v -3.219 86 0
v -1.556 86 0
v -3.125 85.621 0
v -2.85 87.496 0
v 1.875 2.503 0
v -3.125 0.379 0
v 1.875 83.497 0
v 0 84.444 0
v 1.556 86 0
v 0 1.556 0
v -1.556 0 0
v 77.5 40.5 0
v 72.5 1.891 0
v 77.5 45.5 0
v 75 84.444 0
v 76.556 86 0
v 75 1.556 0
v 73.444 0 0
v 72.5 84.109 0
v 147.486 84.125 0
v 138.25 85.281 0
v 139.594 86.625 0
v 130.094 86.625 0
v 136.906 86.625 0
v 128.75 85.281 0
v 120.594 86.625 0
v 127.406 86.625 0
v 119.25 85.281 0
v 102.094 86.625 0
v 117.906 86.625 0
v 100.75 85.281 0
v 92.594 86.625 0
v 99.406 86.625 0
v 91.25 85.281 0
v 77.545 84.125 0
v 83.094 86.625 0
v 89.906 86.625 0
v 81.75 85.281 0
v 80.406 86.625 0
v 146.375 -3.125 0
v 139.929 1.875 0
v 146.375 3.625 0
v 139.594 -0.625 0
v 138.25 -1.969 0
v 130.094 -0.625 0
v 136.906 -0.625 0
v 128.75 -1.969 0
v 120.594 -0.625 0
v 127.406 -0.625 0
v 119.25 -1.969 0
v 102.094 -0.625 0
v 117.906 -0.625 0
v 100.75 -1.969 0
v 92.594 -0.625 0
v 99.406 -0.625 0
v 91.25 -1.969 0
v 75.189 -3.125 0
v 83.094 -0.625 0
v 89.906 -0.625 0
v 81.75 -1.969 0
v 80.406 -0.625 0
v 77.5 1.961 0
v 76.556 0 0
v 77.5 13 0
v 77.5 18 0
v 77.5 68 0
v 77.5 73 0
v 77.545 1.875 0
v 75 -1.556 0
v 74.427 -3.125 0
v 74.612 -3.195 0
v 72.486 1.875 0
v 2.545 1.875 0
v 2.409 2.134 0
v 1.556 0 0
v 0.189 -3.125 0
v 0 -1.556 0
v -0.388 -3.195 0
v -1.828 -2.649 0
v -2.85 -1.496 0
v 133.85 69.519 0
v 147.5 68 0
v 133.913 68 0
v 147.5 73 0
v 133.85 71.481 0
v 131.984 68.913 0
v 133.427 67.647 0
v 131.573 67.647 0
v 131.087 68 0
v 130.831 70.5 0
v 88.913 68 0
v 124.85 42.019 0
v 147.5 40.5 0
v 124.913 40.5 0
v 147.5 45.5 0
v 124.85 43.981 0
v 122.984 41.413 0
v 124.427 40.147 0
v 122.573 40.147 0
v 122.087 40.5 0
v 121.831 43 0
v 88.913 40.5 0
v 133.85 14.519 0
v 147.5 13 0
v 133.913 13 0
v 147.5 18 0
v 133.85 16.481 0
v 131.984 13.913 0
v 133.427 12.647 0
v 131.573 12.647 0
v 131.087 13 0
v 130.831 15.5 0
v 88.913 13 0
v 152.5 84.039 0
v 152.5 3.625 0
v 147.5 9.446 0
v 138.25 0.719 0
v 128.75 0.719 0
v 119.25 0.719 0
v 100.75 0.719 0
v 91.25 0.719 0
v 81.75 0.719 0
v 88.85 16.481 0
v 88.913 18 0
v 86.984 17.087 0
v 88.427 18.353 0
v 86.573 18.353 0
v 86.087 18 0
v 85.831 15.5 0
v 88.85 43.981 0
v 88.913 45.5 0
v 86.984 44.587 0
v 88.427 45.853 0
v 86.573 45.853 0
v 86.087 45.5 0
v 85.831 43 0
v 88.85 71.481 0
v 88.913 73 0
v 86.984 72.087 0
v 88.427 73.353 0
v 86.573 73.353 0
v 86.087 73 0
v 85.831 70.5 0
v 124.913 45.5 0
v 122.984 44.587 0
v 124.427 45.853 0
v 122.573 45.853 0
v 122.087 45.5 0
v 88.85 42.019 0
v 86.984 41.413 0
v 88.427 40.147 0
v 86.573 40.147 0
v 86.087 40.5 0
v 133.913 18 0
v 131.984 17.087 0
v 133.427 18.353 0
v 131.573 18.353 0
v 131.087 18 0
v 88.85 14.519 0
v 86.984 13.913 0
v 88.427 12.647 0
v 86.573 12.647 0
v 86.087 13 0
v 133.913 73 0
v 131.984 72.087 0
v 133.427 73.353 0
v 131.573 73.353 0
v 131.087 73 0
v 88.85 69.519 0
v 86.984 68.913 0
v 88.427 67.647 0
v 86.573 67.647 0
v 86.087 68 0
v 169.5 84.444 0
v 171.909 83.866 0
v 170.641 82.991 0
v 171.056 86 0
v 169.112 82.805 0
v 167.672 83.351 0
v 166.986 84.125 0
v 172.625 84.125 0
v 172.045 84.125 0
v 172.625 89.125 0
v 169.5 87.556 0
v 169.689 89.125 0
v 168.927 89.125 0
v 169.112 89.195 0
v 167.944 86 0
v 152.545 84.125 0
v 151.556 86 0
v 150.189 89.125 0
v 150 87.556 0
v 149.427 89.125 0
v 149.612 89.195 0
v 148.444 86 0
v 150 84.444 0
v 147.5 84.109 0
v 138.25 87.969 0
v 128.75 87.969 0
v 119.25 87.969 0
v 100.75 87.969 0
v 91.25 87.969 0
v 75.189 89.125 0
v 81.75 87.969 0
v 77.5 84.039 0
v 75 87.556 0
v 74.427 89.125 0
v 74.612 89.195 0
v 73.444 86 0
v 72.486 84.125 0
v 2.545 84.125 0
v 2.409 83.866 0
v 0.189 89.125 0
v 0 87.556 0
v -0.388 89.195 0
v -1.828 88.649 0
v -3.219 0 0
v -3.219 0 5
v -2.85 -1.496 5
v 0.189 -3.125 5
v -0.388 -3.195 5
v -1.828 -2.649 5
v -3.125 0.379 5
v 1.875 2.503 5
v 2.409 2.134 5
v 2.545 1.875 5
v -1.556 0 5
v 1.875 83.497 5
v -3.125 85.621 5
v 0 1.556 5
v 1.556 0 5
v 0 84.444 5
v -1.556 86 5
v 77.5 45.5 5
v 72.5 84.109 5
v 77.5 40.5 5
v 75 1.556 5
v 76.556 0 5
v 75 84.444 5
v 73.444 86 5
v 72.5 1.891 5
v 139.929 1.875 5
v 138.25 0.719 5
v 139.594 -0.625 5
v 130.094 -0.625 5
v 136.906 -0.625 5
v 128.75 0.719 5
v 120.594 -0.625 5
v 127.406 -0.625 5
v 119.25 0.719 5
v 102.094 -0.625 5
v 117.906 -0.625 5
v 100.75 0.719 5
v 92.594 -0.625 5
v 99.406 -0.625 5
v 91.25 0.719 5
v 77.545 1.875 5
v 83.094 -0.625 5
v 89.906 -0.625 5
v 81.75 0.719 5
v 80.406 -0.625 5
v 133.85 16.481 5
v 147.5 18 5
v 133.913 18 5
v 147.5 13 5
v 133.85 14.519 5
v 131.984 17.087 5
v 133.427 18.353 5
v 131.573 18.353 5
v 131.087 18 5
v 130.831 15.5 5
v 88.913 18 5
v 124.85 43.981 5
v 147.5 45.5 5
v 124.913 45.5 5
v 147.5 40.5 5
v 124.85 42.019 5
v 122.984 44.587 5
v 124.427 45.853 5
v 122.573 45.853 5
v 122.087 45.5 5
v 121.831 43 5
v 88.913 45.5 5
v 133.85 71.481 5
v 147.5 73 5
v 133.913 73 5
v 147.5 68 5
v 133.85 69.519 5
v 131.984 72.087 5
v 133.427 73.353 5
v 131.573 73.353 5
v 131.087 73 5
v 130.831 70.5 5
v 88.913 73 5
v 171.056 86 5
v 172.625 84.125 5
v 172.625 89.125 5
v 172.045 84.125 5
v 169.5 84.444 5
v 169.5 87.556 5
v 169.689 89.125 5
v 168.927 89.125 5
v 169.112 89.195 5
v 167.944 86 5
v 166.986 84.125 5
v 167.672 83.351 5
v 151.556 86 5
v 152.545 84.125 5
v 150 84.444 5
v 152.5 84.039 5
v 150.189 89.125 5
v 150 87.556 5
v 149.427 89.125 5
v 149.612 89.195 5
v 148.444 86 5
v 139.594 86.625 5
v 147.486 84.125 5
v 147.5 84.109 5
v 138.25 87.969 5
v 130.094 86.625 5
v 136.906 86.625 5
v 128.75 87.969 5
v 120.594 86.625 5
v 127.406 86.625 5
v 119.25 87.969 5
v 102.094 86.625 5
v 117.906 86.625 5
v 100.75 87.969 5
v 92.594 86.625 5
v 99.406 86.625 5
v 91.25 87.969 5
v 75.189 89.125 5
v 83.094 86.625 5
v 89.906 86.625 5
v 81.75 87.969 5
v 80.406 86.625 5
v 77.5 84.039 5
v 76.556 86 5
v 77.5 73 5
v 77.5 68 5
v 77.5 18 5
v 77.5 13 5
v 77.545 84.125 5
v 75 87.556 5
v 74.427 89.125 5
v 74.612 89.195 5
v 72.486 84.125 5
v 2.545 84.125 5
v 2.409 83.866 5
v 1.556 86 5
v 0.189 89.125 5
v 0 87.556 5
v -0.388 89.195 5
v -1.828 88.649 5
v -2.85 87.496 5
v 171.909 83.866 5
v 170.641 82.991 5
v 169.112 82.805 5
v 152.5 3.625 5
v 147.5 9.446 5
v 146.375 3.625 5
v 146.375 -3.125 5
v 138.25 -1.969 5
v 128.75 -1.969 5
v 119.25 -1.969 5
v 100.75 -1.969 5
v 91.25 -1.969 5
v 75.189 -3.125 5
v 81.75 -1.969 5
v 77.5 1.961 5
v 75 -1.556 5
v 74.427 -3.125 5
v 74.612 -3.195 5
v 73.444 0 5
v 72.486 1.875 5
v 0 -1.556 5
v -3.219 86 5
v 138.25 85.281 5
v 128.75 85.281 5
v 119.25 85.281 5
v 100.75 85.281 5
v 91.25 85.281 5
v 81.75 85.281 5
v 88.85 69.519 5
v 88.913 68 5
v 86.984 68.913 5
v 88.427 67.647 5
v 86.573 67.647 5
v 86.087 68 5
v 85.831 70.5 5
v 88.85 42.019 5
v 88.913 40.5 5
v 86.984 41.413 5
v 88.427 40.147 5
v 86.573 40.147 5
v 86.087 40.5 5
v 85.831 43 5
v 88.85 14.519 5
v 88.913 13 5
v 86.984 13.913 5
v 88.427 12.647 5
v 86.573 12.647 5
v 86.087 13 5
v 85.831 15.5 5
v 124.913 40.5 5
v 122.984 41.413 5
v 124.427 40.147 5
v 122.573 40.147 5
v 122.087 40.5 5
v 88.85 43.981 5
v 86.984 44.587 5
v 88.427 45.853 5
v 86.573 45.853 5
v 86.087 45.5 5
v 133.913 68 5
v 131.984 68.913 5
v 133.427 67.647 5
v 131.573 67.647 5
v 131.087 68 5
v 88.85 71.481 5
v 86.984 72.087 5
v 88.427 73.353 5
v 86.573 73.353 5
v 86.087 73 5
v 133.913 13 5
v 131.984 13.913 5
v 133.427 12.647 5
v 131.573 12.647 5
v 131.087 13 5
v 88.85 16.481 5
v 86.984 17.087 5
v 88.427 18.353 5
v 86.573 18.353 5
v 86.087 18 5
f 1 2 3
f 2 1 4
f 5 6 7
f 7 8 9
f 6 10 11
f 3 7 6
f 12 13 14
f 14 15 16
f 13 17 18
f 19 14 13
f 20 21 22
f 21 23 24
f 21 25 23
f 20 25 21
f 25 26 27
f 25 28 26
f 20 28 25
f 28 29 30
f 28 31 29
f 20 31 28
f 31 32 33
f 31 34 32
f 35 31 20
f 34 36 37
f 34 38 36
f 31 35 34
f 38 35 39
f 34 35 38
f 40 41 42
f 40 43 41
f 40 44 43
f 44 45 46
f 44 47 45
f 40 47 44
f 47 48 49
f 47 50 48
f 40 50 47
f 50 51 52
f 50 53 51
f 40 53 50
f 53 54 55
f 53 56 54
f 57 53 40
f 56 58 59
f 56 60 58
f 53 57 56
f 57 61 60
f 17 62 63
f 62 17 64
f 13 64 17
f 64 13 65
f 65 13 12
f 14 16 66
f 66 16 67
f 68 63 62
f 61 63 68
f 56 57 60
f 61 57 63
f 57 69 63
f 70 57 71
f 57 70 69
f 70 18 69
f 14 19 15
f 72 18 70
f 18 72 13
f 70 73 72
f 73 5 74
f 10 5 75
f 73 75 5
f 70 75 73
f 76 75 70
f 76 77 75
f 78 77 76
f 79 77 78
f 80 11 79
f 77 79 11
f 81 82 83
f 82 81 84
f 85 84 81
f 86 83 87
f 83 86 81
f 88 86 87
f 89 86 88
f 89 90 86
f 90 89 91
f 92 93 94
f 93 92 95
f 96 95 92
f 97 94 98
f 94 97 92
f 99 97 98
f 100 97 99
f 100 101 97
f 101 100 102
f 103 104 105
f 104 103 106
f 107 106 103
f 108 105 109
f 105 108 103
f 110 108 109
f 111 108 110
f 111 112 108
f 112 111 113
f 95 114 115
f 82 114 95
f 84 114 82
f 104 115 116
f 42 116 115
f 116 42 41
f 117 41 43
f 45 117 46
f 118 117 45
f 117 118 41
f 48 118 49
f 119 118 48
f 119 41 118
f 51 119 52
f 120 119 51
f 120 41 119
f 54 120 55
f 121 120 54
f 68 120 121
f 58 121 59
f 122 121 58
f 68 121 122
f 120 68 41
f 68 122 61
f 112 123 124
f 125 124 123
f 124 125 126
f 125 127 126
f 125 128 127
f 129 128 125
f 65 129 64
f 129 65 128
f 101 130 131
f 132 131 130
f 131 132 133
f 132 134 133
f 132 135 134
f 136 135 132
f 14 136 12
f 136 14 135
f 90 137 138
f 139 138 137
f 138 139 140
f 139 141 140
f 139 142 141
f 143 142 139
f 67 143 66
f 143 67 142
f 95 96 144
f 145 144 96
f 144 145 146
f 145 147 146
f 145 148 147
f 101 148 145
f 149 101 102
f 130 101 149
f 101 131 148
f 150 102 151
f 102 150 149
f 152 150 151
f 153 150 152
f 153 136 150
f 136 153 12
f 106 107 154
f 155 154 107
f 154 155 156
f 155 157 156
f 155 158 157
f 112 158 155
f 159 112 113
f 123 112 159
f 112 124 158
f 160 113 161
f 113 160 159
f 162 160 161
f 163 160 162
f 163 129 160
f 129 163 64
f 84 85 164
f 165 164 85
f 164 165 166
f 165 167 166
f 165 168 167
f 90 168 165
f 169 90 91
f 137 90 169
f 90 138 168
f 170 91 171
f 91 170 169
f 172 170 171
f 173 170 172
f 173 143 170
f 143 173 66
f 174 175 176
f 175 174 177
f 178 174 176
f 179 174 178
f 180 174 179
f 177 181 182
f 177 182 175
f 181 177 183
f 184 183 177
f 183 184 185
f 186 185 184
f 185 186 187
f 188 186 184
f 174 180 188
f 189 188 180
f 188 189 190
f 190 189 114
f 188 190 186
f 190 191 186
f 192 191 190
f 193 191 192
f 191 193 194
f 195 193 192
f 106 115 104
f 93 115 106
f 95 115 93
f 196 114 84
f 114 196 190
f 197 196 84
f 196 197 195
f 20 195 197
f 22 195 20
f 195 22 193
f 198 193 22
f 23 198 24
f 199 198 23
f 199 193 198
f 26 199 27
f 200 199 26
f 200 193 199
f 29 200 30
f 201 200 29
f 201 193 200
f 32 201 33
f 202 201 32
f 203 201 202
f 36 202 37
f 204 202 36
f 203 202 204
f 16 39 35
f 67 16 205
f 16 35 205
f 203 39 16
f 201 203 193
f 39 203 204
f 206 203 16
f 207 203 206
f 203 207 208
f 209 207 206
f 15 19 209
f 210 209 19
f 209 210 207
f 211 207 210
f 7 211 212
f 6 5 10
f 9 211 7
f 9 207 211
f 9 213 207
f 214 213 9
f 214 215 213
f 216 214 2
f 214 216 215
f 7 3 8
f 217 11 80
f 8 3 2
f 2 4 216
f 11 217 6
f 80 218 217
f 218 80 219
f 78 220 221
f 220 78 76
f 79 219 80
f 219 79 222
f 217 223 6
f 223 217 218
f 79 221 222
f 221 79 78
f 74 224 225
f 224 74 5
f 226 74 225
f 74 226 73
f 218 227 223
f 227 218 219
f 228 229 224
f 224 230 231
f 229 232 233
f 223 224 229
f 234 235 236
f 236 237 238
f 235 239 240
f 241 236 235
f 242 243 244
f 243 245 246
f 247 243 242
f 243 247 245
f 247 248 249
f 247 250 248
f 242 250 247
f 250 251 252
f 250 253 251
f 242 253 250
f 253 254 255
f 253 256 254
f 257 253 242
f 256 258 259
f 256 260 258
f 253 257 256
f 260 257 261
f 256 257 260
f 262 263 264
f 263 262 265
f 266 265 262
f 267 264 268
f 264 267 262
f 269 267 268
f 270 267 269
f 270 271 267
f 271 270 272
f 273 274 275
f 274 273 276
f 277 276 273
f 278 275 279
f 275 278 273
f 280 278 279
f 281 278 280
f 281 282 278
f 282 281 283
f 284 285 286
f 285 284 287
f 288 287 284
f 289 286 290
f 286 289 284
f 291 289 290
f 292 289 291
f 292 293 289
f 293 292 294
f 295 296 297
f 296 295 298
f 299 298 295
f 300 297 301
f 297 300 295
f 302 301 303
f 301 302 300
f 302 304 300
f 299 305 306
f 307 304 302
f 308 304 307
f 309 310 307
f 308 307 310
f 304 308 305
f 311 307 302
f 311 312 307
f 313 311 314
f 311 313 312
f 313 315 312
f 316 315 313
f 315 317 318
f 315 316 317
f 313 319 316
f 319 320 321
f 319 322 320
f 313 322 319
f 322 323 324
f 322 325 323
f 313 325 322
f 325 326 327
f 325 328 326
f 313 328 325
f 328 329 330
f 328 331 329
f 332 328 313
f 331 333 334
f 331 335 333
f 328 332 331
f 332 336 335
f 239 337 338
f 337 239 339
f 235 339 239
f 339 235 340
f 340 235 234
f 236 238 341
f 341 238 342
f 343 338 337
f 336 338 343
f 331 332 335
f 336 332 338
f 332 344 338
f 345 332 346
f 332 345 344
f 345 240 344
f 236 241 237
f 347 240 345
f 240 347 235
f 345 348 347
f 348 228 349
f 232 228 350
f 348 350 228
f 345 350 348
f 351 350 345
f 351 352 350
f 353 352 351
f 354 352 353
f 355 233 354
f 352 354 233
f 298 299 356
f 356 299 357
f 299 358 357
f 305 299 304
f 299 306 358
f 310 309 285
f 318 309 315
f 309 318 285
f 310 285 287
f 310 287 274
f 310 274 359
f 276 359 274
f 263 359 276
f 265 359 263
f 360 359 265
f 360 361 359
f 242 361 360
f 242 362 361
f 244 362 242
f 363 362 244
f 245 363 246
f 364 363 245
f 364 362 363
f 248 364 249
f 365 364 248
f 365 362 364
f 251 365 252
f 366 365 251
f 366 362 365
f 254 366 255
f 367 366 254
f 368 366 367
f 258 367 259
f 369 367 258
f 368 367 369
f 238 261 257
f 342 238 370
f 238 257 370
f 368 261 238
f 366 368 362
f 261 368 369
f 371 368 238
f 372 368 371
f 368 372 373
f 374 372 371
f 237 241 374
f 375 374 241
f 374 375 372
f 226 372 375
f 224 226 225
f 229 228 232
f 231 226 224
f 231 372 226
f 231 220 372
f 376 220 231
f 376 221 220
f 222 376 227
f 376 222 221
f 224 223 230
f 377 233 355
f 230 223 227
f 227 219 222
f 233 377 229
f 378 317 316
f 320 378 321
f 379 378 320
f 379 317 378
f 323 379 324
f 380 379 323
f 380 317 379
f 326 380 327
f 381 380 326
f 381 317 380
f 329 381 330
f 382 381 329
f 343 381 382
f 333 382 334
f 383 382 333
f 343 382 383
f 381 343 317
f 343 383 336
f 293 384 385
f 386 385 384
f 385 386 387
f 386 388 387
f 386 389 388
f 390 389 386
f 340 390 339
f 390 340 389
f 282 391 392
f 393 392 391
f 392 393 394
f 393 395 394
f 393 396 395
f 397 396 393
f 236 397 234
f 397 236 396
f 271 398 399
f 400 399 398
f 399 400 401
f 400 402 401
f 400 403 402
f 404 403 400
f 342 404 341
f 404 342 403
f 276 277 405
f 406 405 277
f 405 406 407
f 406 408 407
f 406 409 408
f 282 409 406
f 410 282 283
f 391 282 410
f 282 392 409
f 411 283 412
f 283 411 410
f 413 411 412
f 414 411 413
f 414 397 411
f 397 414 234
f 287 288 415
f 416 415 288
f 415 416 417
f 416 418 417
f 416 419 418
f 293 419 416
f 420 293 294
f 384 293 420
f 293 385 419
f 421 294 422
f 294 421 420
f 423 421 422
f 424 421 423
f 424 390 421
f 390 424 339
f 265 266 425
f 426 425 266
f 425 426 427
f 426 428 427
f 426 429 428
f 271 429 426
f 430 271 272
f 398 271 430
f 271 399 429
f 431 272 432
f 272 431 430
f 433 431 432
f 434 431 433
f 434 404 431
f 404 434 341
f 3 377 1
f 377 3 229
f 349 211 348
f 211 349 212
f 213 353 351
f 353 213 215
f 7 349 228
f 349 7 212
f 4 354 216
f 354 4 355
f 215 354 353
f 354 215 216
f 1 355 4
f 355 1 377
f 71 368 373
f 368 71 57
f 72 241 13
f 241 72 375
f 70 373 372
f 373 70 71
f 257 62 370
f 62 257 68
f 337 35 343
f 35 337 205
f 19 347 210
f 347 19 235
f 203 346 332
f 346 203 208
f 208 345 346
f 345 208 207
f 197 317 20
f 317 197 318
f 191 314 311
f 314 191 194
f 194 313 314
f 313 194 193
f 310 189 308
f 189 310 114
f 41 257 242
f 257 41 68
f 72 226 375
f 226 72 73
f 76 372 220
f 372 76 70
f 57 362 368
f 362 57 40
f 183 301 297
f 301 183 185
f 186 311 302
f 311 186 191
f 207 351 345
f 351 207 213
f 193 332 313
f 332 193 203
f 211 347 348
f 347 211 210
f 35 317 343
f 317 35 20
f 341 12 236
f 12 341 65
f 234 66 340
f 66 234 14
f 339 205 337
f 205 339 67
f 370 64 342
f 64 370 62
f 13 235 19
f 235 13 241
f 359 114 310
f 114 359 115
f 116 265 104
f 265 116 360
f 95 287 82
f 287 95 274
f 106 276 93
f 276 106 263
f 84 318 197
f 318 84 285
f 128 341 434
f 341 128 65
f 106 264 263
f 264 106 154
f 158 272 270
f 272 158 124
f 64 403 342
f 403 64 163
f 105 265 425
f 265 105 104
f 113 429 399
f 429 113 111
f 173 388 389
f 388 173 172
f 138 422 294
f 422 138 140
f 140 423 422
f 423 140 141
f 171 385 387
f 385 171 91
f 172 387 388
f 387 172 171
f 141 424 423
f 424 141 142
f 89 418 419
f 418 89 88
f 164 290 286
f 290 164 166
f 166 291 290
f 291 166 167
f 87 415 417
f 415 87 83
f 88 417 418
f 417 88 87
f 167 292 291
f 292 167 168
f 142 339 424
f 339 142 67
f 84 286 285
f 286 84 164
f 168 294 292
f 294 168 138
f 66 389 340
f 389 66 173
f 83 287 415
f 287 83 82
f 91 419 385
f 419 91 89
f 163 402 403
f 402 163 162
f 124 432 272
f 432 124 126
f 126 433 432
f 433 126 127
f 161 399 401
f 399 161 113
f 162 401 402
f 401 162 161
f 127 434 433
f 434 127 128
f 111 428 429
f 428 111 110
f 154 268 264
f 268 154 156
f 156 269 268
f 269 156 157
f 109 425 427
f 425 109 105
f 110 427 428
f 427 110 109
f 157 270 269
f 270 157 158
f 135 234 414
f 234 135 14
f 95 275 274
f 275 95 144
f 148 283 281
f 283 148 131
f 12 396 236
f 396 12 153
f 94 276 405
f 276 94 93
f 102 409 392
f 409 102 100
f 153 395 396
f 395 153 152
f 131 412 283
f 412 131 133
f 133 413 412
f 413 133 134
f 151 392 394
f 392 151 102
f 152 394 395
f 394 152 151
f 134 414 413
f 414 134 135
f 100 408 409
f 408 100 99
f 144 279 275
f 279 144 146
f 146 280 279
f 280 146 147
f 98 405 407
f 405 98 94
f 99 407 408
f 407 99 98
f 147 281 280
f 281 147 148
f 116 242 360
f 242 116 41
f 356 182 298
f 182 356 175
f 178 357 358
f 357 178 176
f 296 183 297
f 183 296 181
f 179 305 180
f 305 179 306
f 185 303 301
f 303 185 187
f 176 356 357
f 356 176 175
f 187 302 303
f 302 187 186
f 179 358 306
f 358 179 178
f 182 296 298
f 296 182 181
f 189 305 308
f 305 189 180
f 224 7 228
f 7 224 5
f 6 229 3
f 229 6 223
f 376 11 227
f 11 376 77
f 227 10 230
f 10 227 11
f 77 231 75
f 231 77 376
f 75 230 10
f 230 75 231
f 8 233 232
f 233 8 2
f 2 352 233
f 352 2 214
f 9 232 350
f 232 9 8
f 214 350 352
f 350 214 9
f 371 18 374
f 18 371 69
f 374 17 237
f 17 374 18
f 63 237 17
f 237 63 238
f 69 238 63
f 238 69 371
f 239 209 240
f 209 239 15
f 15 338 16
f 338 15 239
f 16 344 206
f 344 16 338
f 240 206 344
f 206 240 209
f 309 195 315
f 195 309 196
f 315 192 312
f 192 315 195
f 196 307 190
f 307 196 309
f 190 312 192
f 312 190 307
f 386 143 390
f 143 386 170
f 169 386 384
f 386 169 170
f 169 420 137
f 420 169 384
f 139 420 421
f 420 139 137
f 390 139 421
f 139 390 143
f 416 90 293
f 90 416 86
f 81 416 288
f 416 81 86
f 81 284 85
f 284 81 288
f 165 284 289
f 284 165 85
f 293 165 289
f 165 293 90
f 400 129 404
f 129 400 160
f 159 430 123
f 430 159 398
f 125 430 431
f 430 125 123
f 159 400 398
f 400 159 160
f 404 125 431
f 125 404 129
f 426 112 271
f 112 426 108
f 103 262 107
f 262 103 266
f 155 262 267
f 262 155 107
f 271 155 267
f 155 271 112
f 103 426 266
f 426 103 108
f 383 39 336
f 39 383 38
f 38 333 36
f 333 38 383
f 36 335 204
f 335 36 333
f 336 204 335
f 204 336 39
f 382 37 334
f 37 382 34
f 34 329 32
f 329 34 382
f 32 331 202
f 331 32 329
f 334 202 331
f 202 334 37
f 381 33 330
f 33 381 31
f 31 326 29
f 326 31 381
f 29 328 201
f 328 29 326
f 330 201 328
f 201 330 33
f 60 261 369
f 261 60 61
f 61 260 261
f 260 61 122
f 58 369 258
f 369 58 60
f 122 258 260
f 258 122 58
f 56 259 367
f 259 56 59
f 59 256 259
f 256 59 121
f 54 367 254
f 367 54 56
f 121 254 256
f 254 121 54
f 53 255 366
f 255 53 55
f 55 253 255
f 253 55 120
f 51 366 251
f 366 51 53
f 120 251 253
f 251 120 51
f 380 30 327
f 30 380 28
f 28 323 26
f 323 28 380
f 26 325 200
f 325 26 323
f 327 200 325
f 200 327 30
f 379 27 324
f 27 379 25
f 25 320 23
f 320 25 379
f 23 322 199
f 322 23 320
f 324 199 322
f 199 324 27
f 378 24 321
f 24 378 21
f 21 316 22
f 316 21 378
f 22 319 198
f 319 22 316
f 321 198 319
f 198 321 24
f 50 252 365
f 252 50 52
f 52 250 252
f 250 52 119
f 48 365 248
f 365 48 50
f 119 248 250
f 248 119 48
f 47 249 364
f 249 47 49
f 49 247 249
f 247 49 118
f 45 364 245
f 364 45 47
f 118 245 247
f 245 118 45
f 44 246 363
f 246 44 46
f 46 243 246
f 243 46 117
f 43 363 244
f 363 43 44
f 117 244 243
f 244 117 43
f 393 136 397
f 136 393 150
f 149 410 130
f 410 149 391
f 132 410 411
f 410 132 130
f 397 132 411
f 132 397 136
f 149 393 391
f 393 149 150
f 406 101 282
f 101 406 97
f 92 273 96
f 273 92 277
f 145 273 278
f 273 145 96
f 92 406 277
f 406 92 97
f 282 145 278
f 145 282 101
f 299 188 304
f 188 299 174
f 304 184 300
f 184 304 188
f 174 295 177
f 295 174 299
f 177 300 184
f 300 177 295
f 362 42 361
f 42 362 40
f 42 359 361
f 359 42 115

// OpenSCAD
/**
 * Things to contain flexible LED matrix displays
 *
 * Hit F6 to render the part and then export it to STL.
 * Load in your favorite slicer and print it.
 *
 *   -- noah@hack.se, 2018
 */

/**
 * Combine with '32x8 LED Matrix grid for diffuser'
 * https://www.thingiverse.com/thing:1903744
 *
 * Additional hardware: 12x 2.6x10mm plastic screws
 */
backsideFrame32x8();

/**
 * Parts for 8x8 or 16x16 LED matrices
 *
 * Comment the above part by prefixing the module call with an asterisk
 * and then uncomment one of the parts below.  Hit F6 to render and then
 * export as STL.
 *
 */
*squareDiffuserGrid(16); // 16x16 LED matrix
*squareBacksideFrame(16);
*squareDiffuserGrid(8); // Uncomment for 8x8 LED matrix
*squareBacksideFrame(8); // 16x16 LED matrix


// Config
M2hole=1.9;
M2_3hole=2.2;
M3hole=2.7;


// Helper routine
module polyhole(d, h) {
    n = max(round(2 * d),3);
    rotate([0,0,180])
        cylinder(h = h, r = (d / 2) / cos (180 / n), $fn = n);
}


module squareDiffuserGrid(pixels=16) {
	xRows=pixels;
	yRows=pixels;
	cellSize=10;
	thickness=5;
	cylSize=6;
	gridThickness=0.8;
	componentLength=6;
	componentHeight=1.25;

	difference() {
		union() {
			// Grid
			for(x=[1:xRows-1]) {
				tmp = x != xRows/2? gridThickness: gridThickness; //*2
				translate([x*cellSize-tmp/2, 0, 0])
					cube([tmp, cellSize*yRows, thickness]);
			}
			for(y=[1:yRows-1]) {
				tmp = y != yRows/2? gridThickness: gridThickness; //*2
				translate([0, y*cellSize-tmp/2, 0])
					cube([cellSize*xRows, tmp, thickness]);
			}
			// Corners
			for(x=[0,1]) {
				for(y=[0,1]) {
					translate([-cylSize/PI+x*(xRows*cellSize+2*cylSize/PI), -cylSize/PI+y*(yRows*cellSize+2*cylSize/PI), 0])
						polyhole(d=cylSize, h=thickness);
				}
			}
			// Outer joining the corners and the grid
			for(i=[0,1]) {
				// X walls
				translate([-cylSize/2, gridThickness/2-thickness+i*(cellSize*yRows+thickness-gridThickness), 0])
					cube([cylSize+cellSize*xRows, thickness, thickness]);
				// Y walls
				translate([gridThickness/2-thickness+i*(cellSize*xRows+thickness-gridThickness), -cylSize/2, 0])
					cube([thickness, cylSize+cellSize*yRows, thickness]);
			}
		}
		// Make room for external components
		for(y=[1:yRows]) {
			for(x=[1:xRows-1]) {
				translate([x*cellSize-gridThickness,y*cellSize-cellSize/2-componentLength/2,thickness-componentHeight])
					cube([gridThickness*2,componentLength,componentHeight+.5]);
			}
		}
		// Screw holes corners
		for(x=[0,1])
			for(y=[0,1])
				translate([-cylSize/PI+x*(xRows*cellSize+2*cylSize/PI), -cylSize/PI+y*(yRows*cellSize+2*cylSize/PI), -.5])
					polyhole(d=M2_3hole, h=thickness+1);
	}
}


module squareBacksideFrame(pixels=16) {
	xRows=pixels;
	yRows=pixels;
	cellSize=10;
	thickness=5;
	cylSize=6;
	gridThickness=0.8;
	componentLength=6;
	componentHeight=1.25;
	pcbHoleDistance=36;
	usbHoleDistance=9;
	expansionBoardHoleDistanceX=45;
	expansionBoardHoleDistanceY=55;

	height=(cellSize*yRows+thickness-gridThickness);
	width=(cellSize*xRows+thickness-gridThickness);

	difference() {
		union() {
			// Corners
			for(x=[0,1]) {
				for(y=[0,1]) {
					translate([-cylSize/PI+x*(xRows*cellSize+2*cylSize/PI), -cylSize/PI+y*(yRows*cellSize+2*cylSize/PI), 0])
						polyhole(d=cylSize, h=thickness);
				}
			}
			// Outer joining the corners and the grid
			for(i=[0,1]) {
				// X walls
				translate([-cylSize/2, gridThickness/2-thickness+i*(cellSize*yRows+thickness-gridThickness), 0])
					cube([cylSize+cellSize*xRows, thickness, thickness]);
				// Y walls
				translate([gridThickness/2-thickness+i*(cellSize*xRows+thickness-gridThickness), -cylSize/2, 0])
					cube([thickness, cylSize+cellSize*yRows, thickness]);
			}
			// Stabilizator Pycom expansion board
			for(i=[-1,1]) {
				translate([0, height/2-thickness/2+i*expansionBoardHoleDistanceY/2,0])
					cube([width, thickness, thickness]);
				// Screw holes
				translate([15, height/2-i*expansionBoardHoleDistanceY/2,0])
					cylinder(d=6, h=thickness);
				translate([15, height/2-i*expansionBoardHoleDistanceY/2,0])
					cylinder(d=6, h=thickness);
				translate([15+expansionBoardHoleDistanceX, height/2-i*expansionBoardHoleDistanceY/2,0])
					cylinder(d=6, h=thickness);
				translate([15+expansionBoardHoleDistanceX, height/2-i*expansionBoardHoleDistanceY/2,0])
					cylinder(d=6, h=thickness);
			}
			// Adafruit Perma-Proto stabilizator and screw holes
			translate([0, height/2-thickness/2,0])
				cube([15+expansionBoardHoleDistanceX, thickness, thickness]);
			translate([15+expansionBoardHoleDistanceX-thickness/2, height/2-expansionBoardHoleDistanceY/2, 0])
				cube([thickness, expansionBoardHoleDistanceY, thickness]); // Join with stabilizator for Pycom exp board
			translate([15, height/2,0])
				cylinder(d=6, h=thickness);
			translate([15+pcbHoleDistance, height/2,0])
				cylinder(d=6, h=thickness);
		}
		// Screw holes corners
		for(x=[0,1])
			for(y=[0,1])
				translate([-cylSize/PI+x*(xRows*cellSize+2*cylSize/PI), -cylSize/PI+y*(yRows*cellSize+2*cylSize/PI), -.5])
					polyhole(d=M2_3hole, h=thickness+1);
		// SS-5GL micro switch screw holes
		for(y=[0,1]) {
			for(x=[-20,20]) {
				translate([x+width/2-9.5, y*height-thickness/2+gridThickness/2, -.5])
					polyhole(d=M2hole, h=thickness+1);
				translate([x+width/2, y*height-thickness/2+gridThickness/2, -.5])
					polyhole(d=M2hole, h=thickness+1);
				translate([x+width/2+9.5, y*height-thickness/2+gridThickness/2, -.5])
					polyhole(d=M2hole, h=thickness+1);
			}
		}
		for(y=[-20,20]) {
			translate([cellSize*xRows+thickness/2-gridThickness/2, y+height/2-9.5, -.5])
				polyhole(d=M2hole, h=thickness+1);
			translate([cellSize*xRows+thickness/2-gridThickness/2, y+height/2, -.5])
				polyhole(d=M2hole, h=thickness+1);
			translate([cellSize*xRows+thickness/2-gridThickness/2, y+height/2+9.5, -.5])
				polyhole(d=M2hole, h=thickness+1);
		}
		// Permaproto screw holes
		translate([15, height/2, -.5])
			polyhole(d=M3hole, h=thickness+2+1);
		translate([15+pcbHoleDistance, height/2, -.5])
			polyhole(d=M3hole, h=thickness+2+1);
		// Pycom expansion board screw holes
		for(i=[-1,1]) {
			translate([15, height/2-i*expansionBoardHoleDistanceY/2, -.5])
				polyhole(d=M3hole, h=thickness+2+1);
			translate([15, height/2-i*expansionBoardHoleDistanceY/2, -.5])
				cylinder(d=M3hole, h=thickness+2+1);
			translate([15+expansionBoardHoleDistanceX, height/2-i*expansionBoardHoleDistanceY/2, -.5])
				polyhole(d=M3hole, h=thickness+2+1);
			translate([15+expansionBoardHoleDistanceX, height/2-i*expansionBoardHoleDistanceY/2, -.5])
				polyhole(d=M3hole, h=thickness+2+1);
		}
	}
}


module backsideFrame32x8() {
	thickness=5;
	cylSize=6.25;
	screwXDistance=75;
	screwYDistance=86;
	// Extra feature: PCB mounting bars
	pcbHoleDistance=36;
	usbHoleDistance=9;
	expansionBoardHoleDistanceX=45;
	expansionBoardHoleDistanceY=55;

	difference() {
		union() {
			// 2x3 screw holes
			for(x=[0,1,2]) {
				translate([x*screwXDistance, 0, 0])
					polyhole(d=cylSize, h=thickness);
				translate([x*screwXDistance, screwYDistance, 0])
					polyhole(d=cylSize, h=thickness);
			}
			// Stabilizator
			translate([2*screwXDistance-8,-cylSize/2,0])
				rotate([0,0,45])
					cube([14,5,thickness]);
			translate([2*screwXDistance+19.5, screwYDistance, 0])
				polyhole(d=cylSize, h=thickness);

			// X beams to joins screw holes
			for(x=[0,1]) {
				translate([x*screwXDistance, -cylSize/2, 0])
					cube([screwXDistance, thickness, thickness]);
				translate([x*screwXDistance, cylSize/2-thickness+screwYDistance, 0])
					cube([screwXDistance, thickness, thickness]);
			}
			// Stabilizator
			translate([2*screwXDistance, cylSize/2-thickness+screwYDistance, 0])
				cube([19.5+cylSize/2, thickness, thickness]);

			// Y beam to join screw holes
			translate([-cylSize/2, 0, 0])
				cube([thickness, 86, thickness]);
			for(x=[1,2]) {
				translate([x*screwXDistance-thickness/2, 0, 0])
					cube([thickness, screwYDistance, thickness]);
			}

			// Extra feature: PCB mounting bars
			translate([-thickness/2+screwXDistance,0,0]) {
				// Stabilizator Adafruit perma-proto board
				translate([0, screwYDistance/2-thickness/2,0])
					cube([screwXDistance, thickness, thickness]);
				translate([15, screwYDistance/2,0])
					cylinder(d=6, h=thickness);
				translate([15+pcbHoleDistance, screwYDistance/2,0])
					cylinder(d=6, h=thickness);
				// Stabilizator Pycom expansion board
				for(i=[-1,1]) {
					translate([0, screwYDistance/2-thickness/2+i*expansionBoardHoleDistanceY/2, 0])
						cube([screwXDistance, thickness, thickness]);
					// Screw holes
					translate([15, screwYDistance/2-i*expansionBoardHoleDistanceY/2, 0])
						cylinder(d=6, h=thickness);
					translate([15, screwYDistance/2-i*expansionBoardHoleDistanceY/2, 0])
						cylinder(d=6, h=thickness);
					translate([15+expansionBoardHoleDistanceX, screwYDistance/2-i*expansionBoardHoleDistanceY/2, 0])
						cylinder(d=6, h=thickness);
					translate([15+expansionBoardHoleDistanceX, screwYDistance/2-i*expansionBoardHoleDistanceY/2, 0])
						cylinder(d=6, h=thickness);
				}
			}
		}
		// Screw holes
		for(x=[0,1,2]) {
			translate([x*screwXDistance, 0, -1])
				polyhole(d=M2_3hole, h=thickness+2);
			translate([x*screwXDistance, screwYDistance, -1])
				polyhole(d=M2_3hole, h=thickness+2);
		}
		// Stabilizator hole
		translate([2*screwXDistance+19.5,screwYDistance,-1]) polyhole(d=M2_3hole, h=thickness+2);
		// Stabilizator removal bottom side
	    translate([2*screwXDistance-cylSize/2-0.5,-cylSize/2-0.5,-1]) cube([cylSize+1,cylSize+1, thickness+2]);


		// Extra feature: PCB mounting bars
		translate([-thickness/2+screwXDistance,0,0]) {
			// Adafruit perma-proto screw holes
			translate([15, screwYDistance/2, -.5])
				polyhole(d=M3hole, h=thickness+1);
			translate([15+pcbHoleDistance, screwYDistance/2, -.5])
				polyhole(d=M3hole, h=thickness+1);
			// Pycom expansion board screw holes
			for(i=[-1,1]) {
				translate([15, screwYDistance/2-i*expansionBoardHoleDistanceY/2, -.5])
					polyhole(d=M3hole, h=thickness+2+1);
				translate([15, screwYDistance/2-i*expansionBoardHoleDistanceY/2, -.5])
					polyhole(d=M3hole, h=thickness+2+1);
				translate([15+expansionBoardHoleDistanceX, screwYDistance/2-i*expansionBoardHoleDistanceY/2, -.5])
					polyhole(d=M3hole, h=thickness+2+1);
				translate([15+expansionBoardHoleDistanceX, screwYDistance/2-i*expansionBoardHoleDistanceY/2, -.5])
					polyhole(d=M3hole, h=thickness+2+1);
			}
			// SS-5GL micro switch screw holes
			for(x=[1,3]) {
				translate([x*screwXDistance/4-9.5, cylSize/2-thickness/2+screwYDistance, -.5]) polyhole(d=M2hole, h=thickness+1);
				translate([x*screwXDistance/4, cylSize/2-thickness/2+screwYDistance, -.5]) polyhole(d=M2hole, h=thickness+1);
				translate([x*screwXDistance/4+9.5, cylSize/2-thickness/2+screwYDistance, -.5]) polyhole(d=M2hole, h=thickness+1);
				translate([x*screwXDistance/4-9.5, -cylSize/2+thickness/2, -.5]) polyhole(d=M2hole, h=thickness+1);
				translate([x*screwXDistance/4, -cylSize/2+thickness/2, -.5]) polyhole(d=M2hole, h=thickness+1);
				translate([x*screwXDistance/4+9.5, -cylSize/2+thickness/2, -.5]) polyhole(d=M2hole, h=thickness+1);
			}
		}
	}
}
